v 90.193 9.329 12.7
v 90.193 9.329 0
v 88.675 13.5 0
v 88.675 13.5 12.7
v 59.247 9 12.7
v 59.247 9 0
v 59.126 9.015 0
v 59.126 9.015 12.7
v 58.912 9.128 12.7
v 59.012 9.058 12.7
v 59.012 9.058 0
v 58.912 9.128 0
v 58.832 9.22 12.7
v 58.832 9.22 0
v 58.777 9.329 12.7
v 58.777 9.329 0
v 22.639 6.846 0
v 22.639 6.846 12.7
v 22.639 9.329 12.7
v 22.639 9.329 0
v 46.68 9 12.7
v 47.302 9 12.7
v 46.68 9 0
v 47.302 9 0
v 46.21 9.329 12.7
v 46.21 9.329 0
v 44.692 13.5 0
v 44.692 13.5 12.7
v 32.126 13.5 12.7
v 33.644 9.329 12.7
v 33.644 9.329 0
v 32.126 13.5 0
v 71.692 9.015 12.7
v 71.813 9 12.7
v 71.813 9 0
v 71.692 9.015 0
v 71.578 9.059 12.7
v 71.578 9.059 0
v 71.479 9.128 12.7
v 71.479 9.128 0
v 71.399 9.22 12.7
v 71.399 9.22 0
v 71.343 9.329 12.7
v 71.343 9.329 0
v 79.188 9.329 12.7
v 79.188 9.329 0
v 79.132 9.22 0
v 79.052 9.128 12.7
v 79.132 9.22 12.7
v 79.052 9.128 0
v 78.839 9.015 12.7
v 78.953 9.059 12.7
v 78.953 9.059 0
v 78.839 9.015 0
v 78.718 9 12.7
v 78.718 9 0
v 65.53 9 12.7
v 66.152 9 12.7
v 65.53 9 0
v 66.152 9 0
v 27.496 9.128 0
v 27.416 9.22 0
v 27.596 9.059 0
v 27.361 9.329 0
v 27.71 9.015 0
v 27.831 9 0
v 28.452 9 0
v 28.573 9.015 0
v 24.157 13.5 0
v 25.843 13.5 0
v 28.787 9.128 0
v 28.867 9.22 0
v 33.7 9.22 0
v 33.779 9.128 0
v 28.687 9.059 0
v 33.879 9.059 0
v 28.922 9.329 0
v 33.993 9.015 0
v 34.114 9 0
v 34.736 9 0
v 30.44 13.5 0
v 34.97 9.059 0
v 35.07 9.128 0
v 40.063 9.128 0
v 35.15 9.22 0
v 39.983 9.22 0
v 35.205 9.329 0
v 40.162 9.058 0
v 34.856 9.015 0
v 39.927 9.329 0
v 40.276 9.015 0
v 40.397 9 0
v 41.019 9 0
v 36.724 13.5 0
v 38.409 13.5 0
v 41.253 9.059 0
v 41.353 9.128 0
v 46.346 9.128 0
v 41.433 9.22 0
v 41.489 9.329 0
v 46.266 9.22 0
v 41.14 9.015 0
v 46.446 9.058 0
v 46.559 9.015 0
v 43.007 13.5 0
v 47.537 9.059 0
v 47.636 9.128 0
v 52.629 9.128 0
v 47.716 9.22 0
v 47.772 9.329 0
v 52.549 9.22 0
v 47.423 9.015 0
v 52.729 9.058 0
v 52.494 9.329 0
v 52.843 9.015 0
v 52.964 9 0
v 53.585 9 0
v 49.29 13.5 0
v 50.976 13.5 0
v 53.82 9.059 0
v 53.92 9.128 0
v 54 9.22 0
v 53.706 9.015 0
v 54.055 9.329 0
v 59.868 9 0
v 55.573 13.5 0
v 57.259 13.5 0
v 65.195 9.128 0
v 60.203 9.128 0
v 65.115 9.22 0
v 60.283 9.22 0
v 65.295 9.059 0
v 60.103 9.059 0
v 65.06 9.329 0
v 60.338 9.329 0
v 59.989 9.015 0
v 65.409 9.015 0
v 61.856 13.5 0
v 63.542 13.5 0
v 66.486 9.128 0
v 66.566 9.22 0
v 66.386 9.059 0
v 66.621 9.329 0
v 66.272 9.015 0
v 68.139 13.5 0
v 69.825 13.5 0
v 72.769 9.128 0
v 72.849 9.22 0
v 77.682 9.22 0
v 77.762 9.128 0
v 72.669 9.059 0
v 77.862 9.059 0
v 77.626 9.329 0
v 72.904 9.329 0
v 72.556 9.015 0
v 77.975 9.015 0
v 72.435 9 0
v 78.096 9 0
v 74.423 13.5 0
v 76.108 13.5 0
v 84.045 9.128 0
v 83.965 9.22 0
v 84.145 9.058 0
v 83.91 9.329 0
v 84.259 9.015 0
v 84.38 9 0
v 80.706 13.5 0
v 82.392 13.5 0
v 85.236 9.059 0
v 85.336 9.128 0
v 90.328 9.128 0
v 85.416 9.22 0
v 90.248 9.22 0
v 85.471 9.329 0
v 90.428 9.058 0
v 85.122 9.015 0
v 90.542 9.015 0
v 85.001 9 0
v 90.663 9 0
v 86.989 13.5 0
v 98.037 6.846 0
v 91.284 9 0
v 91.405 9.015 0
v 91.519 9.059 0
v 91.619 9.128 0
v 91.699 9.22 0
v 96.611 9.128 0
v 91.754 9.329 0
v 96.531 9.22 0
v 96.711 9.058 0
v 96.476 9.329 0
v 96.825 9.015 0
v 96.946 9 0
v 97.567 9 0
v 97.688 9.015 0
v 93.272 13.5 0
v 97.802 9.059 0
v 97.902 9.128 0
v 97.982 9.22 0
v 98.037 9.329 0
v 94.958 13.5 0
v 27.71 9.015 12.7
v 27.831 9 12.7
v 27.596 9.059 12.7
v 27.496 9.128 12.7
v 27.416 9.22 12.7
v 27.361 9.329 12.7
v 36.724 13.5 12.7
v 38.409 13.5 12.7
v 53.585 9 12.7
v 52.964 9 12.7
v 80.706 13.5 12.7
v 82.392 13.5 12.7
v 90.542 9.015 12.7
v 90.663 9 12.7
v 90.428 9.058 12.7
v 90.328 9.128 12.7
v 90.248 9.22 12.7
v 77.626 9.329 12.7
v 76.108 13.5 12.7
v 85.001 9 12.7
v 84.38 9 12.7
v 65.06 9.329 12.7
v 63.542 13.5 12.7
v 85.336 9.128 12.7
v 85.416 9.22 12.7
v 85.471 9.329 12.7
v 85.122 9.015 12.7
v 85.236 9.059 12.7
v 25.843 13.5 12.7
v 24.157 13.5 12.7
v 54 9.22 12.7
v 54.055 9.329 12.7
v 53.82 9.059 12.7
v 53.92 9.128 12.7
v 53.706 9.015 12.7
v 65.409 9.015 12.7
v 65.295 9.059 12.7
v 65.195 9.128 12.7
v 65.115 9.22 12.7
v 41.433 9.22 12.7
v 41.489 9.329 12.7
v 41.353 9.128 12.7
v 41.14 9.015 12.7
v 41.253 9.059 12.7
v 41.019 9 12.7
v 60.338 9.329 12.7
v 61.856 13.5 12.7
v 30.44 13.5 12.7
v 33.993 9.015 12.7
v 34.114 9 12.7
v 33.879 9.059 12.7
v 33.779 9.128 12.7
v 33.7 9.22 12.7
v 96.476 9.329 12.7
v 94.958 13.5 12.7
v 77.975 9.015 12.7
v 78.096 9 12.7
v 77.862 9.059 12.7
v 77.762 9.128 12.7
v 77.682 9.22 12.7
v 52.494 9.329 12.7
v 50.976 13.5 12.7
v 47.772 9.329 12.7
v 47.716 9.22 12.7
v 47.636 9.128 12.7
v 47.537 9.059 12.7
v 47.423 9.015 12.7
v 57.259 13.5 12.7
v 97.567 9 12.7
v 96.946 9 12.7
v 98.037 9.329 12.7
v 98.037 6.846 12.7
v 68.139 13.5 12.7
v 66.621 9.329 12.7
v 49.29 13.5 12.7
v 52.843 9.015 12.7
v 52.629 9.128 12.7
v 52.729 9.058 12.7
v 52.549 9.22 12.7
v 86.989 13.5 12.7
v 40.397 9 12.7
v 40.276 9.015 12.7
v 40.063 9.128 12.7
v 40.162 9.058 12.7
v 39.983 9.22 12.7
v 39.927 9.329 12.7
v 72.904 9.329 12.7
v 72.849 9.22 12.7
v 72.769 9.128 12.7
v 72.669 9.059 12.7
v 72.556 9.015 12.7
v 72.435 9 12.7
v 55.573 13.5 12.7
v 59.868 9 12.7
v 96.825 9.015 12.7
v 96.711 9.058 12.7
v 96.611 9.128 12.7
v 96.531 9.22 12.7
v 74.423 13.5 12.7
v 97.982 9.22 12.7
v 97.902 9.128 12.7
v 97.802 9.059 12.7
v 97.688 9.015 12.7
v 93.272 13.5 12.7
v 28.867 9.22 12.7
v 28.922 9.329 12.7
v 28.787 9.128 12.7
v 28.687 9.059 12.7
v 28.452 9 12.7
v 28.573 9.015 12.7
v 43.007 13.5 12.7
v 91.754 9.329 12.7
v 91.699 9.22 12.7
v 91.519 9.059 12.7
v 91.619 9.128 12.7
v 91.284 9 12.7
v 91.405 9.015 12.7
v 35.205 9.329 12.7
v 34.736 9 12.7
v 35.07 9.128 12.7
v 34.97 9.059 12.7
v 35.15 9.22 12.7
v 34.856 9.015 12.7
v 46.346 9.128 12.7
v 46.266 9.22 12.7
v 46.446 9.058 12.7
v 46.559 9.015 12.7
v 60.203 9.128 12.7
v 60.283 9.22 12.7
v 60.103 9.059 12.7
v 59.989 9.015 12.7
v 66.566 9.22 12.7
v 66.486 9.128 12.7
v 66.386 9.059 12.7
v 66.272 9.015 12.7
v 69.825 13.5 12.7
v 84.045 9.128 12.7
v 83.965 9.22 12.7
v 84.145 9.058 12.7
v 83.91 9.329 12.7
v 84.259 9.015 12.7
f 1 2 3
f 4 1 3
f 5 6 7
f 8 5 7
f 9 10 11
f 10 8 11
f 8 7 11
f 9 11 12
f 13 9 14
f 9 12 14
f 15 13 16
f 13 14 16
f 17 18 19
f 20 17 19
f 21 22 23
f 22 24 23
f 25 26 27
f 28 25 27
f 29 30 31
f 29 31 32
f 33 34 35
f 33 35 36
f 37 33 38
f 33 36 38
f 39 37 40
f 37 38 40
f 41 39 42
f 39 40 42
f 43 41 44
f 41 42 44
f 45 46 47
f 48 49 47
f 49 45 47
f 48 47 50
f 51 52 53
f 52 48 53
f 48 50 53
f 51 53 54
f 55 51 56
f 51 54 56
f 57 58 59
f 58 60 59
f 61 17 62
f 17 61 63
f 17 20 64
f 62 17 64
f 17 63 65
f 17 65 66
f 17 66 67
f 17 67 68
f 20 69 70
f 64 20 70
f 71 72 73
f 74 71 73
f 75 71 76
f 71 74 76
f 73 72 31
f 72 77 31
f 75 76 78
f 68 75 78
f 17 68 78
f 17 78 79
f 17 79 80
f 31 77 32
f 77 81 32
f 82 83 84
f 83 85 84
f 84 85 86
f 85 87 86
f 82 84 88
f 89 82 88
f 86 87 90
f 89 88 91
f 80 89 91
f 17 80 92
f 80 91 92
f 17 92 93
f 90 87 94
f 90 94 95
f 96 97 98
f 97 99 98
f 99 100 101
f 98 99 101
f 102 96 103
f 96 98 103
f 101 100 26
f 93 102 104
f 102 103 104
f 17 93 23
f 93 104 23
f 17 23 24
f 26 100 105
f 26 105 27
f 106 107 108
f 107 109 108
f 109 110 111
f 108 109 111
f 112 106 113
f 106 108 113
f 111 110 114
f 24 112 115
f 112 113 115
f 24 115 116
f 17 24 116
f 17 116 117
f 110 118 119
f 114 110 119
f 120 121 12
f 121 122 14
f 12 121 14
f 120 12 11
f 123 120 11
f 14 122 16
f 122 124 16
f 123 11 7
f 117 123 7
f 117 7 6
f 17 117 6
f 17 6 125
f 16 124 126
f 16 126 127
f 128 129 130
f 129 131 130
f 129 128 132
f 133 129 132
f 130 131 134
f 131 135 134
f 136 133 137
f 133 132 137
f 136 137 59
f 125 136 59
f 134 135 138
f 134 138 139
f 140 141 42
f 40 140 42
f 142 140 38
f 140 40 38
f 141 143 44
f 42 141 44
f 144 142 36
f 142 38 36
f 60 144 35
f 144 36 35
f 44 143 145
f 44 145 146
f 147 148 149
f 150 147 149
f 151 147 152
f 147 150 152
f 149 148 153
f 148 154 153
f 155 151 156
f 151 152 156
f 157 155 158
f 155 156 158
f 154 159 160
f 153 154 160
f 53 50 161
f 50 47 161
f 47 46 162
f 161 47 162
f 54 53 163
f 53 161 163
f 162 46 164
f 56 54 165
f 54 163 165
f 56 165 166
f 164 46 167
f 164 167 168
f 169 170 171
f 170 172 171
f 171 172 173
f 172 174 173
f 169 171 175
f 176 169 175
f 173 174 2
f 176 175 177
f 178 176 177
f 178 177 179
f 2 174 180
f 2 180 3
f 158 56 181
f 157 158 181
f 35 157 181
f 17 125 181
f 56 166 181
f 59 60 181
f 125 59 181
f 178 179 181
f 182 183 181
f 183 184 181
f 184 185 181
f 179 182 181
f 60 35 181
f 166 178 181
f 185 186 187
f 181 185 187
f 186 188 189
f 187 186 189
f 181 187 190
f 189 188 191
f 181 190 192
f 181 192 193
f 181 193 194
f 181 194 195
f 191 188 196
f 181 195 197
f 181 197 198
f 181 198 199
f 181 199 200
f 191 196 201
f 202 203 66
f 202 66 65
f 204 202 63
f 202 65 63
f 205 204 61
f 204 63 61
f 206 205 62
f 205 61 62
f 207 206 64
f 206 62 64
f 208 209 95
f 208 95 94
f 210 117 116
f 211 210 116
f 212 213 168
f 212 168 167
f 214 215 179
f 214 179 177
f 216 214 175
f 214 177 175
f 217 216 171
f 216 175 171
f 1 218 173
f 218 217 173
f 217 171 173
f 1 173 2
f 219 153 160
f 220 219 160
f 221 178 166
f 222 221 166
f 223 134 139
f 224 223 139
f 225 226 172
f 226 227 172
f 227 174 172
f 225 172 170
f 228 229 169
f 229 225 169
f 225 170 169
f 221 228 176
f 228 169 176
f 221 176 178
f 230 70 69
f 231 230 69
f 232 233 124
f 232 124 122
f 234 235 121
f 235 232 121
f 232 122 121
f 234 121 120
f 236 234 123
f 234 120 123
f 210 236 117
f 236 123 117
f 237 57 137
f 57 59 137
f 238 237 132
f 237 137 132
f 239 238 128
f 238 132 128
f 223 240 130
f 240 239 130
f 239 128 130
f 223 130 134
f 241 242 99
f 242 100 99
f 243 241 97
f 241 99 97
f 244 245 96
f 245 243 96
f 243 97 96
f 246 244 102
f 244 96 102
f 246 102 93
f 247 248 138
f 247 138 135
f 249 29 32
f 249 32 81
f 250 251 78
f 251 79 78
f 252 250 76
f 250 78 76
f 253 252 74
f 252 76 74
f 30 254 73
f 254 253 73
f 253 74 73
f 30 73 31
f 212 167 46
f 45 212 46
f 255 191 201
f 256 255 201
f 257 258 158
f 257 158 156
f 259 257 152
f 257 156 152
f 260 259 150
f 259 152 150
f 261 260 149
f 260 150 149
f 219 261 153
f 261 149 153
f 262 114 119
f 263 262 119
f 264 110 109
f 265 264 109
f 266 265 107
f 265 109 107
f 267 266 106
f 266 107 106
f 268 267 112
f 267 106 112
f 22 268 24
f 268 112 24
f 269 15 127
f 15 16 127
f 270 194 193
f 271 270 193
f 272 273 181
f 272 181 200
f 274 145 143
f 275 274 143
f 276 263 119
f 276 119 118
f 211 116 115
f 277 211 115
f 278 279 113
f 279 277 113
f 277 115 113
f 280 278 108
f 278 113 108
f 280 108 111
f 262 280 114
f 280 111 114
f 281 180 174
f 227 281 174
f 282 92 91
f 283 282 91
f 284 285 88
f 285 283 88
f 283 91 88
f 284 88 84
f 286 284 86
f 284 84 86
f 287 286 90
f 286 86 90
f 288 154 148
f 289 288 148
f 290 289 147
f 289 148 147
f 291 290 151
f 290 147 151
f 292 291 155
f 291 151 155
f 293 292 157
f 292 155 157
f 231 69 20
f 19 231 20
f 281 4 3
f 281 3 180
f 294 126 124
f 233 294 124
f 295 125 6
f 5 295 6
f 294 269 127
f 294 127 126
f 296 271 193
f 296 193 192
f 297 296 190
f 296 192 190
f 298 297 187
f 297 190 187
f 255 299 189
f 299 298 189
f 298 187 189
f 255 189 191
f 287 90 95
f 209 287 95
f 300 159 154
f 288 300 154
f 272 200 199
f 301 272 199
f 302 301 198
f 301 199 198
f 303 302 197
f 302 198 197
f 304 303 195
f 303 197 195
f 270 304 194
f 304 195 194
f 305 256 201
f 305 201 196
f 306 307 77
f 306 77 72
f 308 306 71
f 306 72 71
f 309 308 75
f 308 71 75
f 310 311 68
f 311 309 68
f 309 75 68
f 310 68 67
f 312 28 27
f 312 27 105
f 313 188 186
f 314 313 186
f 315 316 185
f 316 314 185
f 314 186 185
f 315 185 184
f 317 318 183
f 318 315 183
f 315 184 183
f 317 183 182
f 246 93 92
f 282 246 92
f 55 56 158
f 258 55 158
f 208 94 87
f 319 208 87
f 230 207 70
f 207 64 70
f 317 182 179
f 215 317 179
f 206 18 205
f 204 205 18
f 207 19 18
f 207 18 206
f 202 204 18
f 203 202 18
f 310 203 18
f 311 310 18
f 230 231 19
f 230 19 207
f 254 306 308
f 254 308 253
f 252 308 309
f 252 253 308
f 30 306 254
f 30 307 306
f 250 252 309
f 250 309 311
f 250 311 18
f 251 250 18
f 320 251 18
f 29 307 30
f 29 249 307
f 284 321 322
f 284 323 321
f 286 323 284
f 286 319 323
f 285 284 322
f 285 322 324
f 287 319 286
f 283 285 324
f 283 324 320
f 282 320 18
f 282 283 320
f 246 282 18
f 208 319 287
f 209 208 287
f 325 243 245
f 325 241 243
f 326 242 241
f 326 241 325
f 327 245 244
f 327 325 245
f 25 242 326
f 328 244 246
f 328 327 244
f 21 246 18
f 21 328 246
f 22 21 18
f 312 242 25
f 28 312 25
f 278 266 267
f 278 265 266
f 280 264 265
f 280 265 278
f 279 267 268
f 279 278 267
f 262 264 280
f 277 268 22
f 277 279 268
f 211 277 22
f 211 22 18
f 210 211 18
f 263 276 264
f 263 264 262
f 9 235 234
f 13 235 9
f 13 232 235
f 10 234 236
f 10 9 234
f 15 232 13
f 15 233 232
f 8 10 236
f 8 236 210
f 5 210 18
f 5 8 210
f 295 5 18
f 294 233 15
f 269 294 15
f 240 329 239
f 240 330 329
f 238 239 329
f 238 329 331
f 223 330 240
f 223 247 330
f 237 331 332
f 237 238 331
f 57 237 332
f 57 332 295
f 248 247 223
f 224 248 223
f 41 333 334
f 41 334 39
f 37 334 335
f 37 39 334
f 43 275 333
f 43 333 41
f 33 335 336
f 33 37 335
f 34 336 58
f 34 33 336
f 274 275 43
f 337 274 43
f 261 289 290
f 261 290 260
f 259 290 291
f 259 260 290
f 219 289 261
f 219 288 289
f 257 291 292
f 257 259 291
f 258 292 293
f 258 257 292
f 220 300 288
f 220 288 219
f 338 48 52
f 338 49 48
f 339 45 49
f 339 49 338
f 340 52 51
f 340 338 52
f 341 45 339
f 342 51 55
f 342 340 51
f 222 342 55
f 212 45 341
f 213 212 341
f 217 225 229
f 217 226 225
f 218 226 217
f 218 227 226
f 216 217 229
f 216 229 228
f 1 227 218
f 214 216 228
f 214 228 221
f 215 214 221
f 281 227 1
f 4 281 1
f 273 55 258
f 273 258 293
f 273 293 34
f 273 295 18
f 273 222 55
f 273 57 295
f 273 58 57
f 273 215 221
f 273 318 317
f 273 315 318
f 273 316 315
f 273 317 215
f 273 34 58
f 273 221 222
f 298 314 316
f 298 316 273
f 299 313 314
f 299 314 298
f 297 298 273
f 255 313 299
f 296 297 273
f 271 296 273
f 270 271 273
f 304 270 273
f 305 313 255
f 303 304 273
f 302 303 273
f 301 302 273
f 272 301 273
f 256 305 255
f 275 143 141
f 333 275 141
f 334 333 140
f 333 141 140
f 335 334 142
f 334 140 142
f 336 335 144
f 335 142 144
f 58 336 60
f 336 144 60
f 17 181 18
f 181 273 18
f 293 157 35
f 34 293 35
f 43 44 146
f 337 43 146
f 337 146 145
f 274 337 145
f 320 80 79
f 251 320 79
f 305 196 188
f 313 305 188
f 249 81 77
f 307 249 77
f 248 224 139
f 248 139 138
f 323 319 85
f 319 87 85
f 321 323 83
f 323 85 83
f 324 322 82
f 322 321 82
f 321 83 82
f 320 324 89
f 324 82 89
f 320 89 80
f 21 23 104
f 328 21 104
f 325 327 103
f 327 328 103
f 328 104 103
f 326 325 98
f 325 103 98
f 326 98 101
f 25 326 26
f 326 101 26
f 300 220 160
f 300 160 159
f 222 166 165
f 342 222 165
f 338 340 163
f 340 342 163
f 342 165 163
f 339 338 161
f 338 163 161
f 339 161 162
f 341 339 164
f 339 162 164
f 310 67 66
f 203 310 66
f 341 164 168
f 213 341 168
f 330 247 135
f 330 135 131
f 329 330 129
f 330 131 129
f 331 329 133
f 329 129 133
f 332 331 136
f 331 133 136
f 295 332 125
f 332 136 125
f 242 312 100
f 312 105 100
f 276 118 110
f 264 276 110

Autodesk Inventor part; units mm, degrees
ref_plane "YZ Plane" through (0, 0, 0) normal (1, 0, 0) x (0, 1, 0)
ref_plane "XZ Plane" through (0, 0, 0) normal (0, 1, 0) x (-1, 0, 0)
ref_plane "XY Plane" through (0, 0, 0) normal (0, 0, 1) x (1, 0, 0)
sketch "Sketch1" plane through (0, 0, 0) normal (0, 0, 1) x (1, 0, 0)
  line L0 (27.361, 9.329) -> (25.8429, 13.5)
  line L1 (25.8429, 13.5) -> (24.1571, 13.5)
  line L2 (24.1571, 13.5) -> (22.639, 9.329)
  arc A0 (22.1692, 9) -> (22.639, 9.329) centre (22.1692, 9.5) ccw
  line L3 (22.1692, 9) -> (0, 9)
  line L4 (0, 9) -> (0, 0)
  line L5 (0, 0) -> (175.6637, 0)
  line L6 (175.6637, 0) -> (175.6637, 9)
  line L7 (175.6637, 9) -> (153.4945, 9)
  arc A1 (153.0247, 9.329) -> (153.4945, 9) centre (153.4945, 9.5) ccw
  line L8 (153.0247, 9.329) -> (151.5066, 13.5)
  line L9 (151.5066, 13.5) -> (149.8209, 13.5)
  line L10 (149.8209, 13.5) -> (148.3027, 9.329)
  arc A2 (147.8329, 9) -> (148.3027, 9.329) centre (147.8329, 9.5) ccw
  line L11 (147.8329, 9) -> (147.2113, 9)
  arc A3 (146.7415, 9.329) -> (147.2113, 9) centre (147.2113, 9.5) ccw
  line L12 (146.7415, 9.329) -> (145.2234, 13.5)
  line L13 (145.2234, 13.5) -> (143.5377, 13.5)
  line L14 (143.5377, 13.5) -> (142.0195, 9.329)
  arc A4 (141.5497, 9) -> (142.0195, 9.329) centre (141.5497, 9.5) ccw
  line L15 (141.5497, 9) -> (140.9282, 9)
  arc A5 (140.4583, 9.329) -> (140.9282, 9) centre (140.9282, 9.5) ccw
  line L16 (140.4583, 9.329) -> (138.9402, 13.5)
  line L17 (138.9402, 13.5) -> (137.2545, 13.5)
  line L18 (137.2545, 13.5) -> (135.7364, 9.329)
  arc A6 (135.2665, 9) -> (135.7364, 9.329) centre (135.2665, 9.5) ccw
  line L19 (135.2665, 9) -> (134.645, 9)
  arc A7 (134.1751, 9.329) -> (134.645, 9) centre (134.645, 9.5) ccw
  line L20 (134.1751, 9.329) -> (132.657, 13.5)
  line L21 (132.657, 13.5) -> (130.9713, 13.5)
  line L22 (130.9713, 13.5) -> (129.4532, 9.329)
  arc A8 (128.9833, 9) -> (129.4532, 9.329) centre (128.9833, 9.5) ccw
  line L23 (128.9833, 9) -> (128.3618, 9)
  arc A9 (127.8919, 9.329) -> (128.3618, 9) centre (128.3618, 9.5) ccw
  line L24 (127.8919, 9.329) -> (126.3738, 13.5)
  line L25 (126.3738, 13.5) -> (124.6881, 13.5)
  line L26 (124.6881, 13.5) -> (123.17, 9.329)
  arc A10 (122.7001, 9) -> (123.17, 9.329) centre (122.7001, 9.5) ccw
  line L27 (122.7001, 9) -> (122.0786, 9)
  arc A11 (121.6088, 9.329) -> (122.0786, 9) centre (122.0786, 9.5) ccw
  line L28 (121.6088, 9.329) -> (120.0906, 13.5)
  line L29 (120.0906, 13.5) -> (118.4049, 13.5)
  line L30 (118.4049, 13.5) -> (116.8868, 9.329)
  arc A12 (116.417, 9) -> (116.8868, 9.329) centre (116.417, 9.5) ccw
  line L31 (116.417, 9) -> (115.7954, 9)
  arc A13 (115.3256, 9.329) -> (115.7954, 9) centre (115.7954, 9.5) ccw
  line L32 (115.3256, 9.329) -> (113.8075, 13.5)
  line L33 (113.8075, 13.5) -> (112.1217, 13.5)
  line L34 (112.1217, 13.5) -> (110.6036, 9.329)
  arc A14 (110.1338, 9) -> (110.6036, 9.329) centre (110.1338, 9.5) ccw
  line L35 (110.1338, 9) -> (109.5122, 9)
  arc A15 (109.0424, 9.329) -> (109.5122, 9) centre (109.5122, 9.5) ccw
  line L36 (109.0424, 9.329) -> (107.5243, 13.5)
  line L37 (107.5243, 13.5) -> (105.8386, 13.5)
  line L38 (105.8386, 13.5) -> (104.3204, 9.329)
  arc A16 (103.8506, 9) -> (104.3204, 9.329) centre (103.8506, 9.5) ccw
  line L39 (103.8506, 9) -> (103.229, 9)
  arc A17 (102.7592, 9.329) -> (103.229, 9) centre (103.229, 9.5) ccw
  line L40 (102.7592, 9.329) -> (101.2411, 13.5)
  line L41 (101.2411, 13.5) -> (99.5554, 13.5)
  line L42 (99.5554, 13.5) -> (98.0372, 9.329)
  arc A18 (97.5674, 9) -> (98.0372, 9.329) centre (97.5674, 9.5) ccw
  line L43 (97.5674, 9) -> (96.9459, 9)
  arc A19 (96.476, 9.329) -> (96.9459, 9) centre (96.9459, 9.5) ccw
  line L44 (96.476, 9.329) -> (94.9579, 13.5)
  line L45 (94.9579, 13.5) -> (93.2722, 13.5)
  line L46 (93.2722, 13.5) -> (91.7541, 9.329)
  arc A20 (91.2842, 9) -> (91.7541, 9.329) centre (91.2842, 9.5) ccw
  line L47 (91.2842, 9) -> (90.6627, 9)
  arc A21 (90.1928, 9.329) -> (90.6627, 9) centre (90.6627, 9.5) ccw
  line L48 (90.1928, 9.329) -> (88.6747, 13.5)
  line L49 (88.6747, 13.5) -> (86.989, 13.5)
  line L50 (86.989, 13.5) -> (85.4709, 9.329)
  arc A22 (85.001, 9) -> (85.4709, 9.329) centre (85.001, 9.5) ccw
  line L51 (85.001, 9) -> (84.3795, 9)
  arc A23 (83.9096, 9.329) -> (84.3795, 9) centre (84.3795, 9.5) ccw
  line L52 (83.9096, 9.329) -> (82.3915, 13.5)
  line L53 (82.3915, 13.5) -> (80.7058, 13.5)
  line L54 (80.7058, 13.5) -> (79.1877, 9.329)
  arc A24 (78.7178, 9) -> (79.1877, 9.329) centre (78.7178, 9.5) ccw
  line L55 (78.7178, 9) -> (78.0963, 9)
  arc A25 (77.6265, 9.329) -> (78.0963, 9) centre (78.0963, 9.5) ccw
  line L56 (77.6265, 9.329) -> (76.1083, 13.5)
  line L57 (76.1083, 13.5) -> (74.4226, 13.5)
  line L58 (74.4226, 13.5) -> (72.9045, 9.329)
  arc A26 (72.4347, 9) -> (72.9045, 9.329) centre (72.4347, 9.5) ccw
  line L59 (72.4347, 9) -> (71.8131, 9)
  arc A27 (71.3433, 9.329) -> (71.8131, 9) centre (71.8131, 9.5) ccw
  line L60 (71.3433, 9.329) -> (69.8252, 13.5)
  line L61 (69.8252, 13.5) -> (68.1394, 13.5)
  line L62 (68.1394, 13.5) -> (66.6213, 9.329)
  arc A28 (66.1515, 9) -> (66.6213, 9.329) centre (66.1515, 9.5) ccw
  line L63 (66.1515, 9) -> (65.5299, 9)
  arc A29 (65.0601, 9.329) -> (65.5299, 9) centre (65.5299, 9.5) ccw
  line L64 (65.0601, 9.329) -> (63.542, 13.5)
  line L65 (63.542, 13.5) -> (61.8563, 13.5)
  line L66 (61.8563, 13.5) -> (60.3381, 9.329)
  arc A30 (59.8683, 9) -> (60.3381, 9.329) centre (59.8683, 9.5) ccw
  line L67 (59.8683, 9) -> (59.2468, 9)
  arc A31 (58.7769, 9.329) -> (59.2468, 9) centre (59.2468, 9.5) ccw
  line L68 (58.7769, 9.329) -> (57.2588, 13.5)
  line L69 (57.2588, 13.5) -> (55.5731, 13.5)
  line L70 (55.5731, 13.5) -> (54.0549, 9.329)
  arc A32 (53.5851, 9) -> (54.0549, 9.329) centre (53.5851, 9.5) ccw
  line L71 (53.5851, 9) -> (52.9636, 9)
  arc A33 (52.4937, 9.329) -> (52.9636, 9) centre (52.9636, 9.5) ccw
  line L72 (52.4937, 9.329) -> (50.9756, 13.5)
  line L73 (50.9756, 13.5) -> (49.2899, 13.5)
  line L74 (49.2899, 13.5) -> (47.7718, 9.329)
  arc A34 (47.3019, 9) -> (47.7718, 9.329) centre (47.3019, 9.5) ccw
  line L75 (47.3019, 9) -> (46.6804, 9)
  arc A35 (46.2105, 9.329) -> (46.6804, 9) centre (46.6804, 9.5) ccw
  line L76 (46.2105, 9.329) -> (44.6924, 13.5)
  line L77 (44.6924, 13.5) -> (43.0067, 13.5)
  line L78 (43.0067, 13.5) -> (41.4886, 9.329)
  arc A36 (41.0187, 9) -> (41.4886, 9.329) centre (41.0187, 9.5) ccw
  line L79 (41.0187, 9) -> (40.3972, 9)
  arc A37 (39.9273, 9.329) -> (40.3972, 9) centre (40.3972, 9.5) ccw
  line L80 (39.9273, 9.329) -> (38.4092, 13.5)
  line L81 (38.4092, 13.5) -> (36.7235, 13.5)
  line L82 (36.7235, 13.5) -> (35.2054, 9.329)
  arc A38 (34.7355, 9) -> (35.2054, 9.329) centre (34.7355, 9.5) ccw
  line L83 (34.7355, 9) -> (34.114, 9)
  arc A39 (33.6442, 9.329) -> (34.114, 9) centre (34.114, 9.5) ccw
  line L84 (33.6442, 9.329) -> (32.126, 13.5)
  line L85 (32.126, 13.5) -> (30.4403, 13.5)
  line L86 (30.4403, 13.5) -> (28.9222, 9.329)
  arc A40 (28.4524, 9) -> (28.9222, 9.329) centre (28.4524, 9.5) ccw
  line L87 (28.4524, 9) -> (27.8308, 9)
  arc A41 (27.361, 9.329) -> (27.8308, 9) centre (27.8308, 9.5) ccw
  point P0 (87.8319, 5)
extrude "Extrusion1" add sketch "Sketch1" along normal blind 12.7
sketch "Sketch2" plane through (0, 0, 12.7) normal (0, 0, 1) x (1, 0, 0)
  line L0 (0, 9) -> (22.1692, 9) projected
  line L1 (175.6637, 9) -> (153.4945, 9) projected
  line L2 (0, 9) -> (175.6637, 9)
  point P0 (0, 0)
sketch "Sketch3" plane through (0, 0, 12.7) normal (0, 0, 1) x (1, 0, 0)
  line L0 (22.639, 9.329) -> (24.1571, 13.5) projected
  line L1 (175.6637, 0) -> (0, 0) projected
  line L2 (22.639, 9.329) -> (0, 9.329)
  line L3 (0, 9.329) -> (0, 0)
  line L4 (0, 0) -> (22.639, 0)
  line L5 (22.639, 0) -> (22.639, 9.329)
  line L6 (22.639, 0) -> (98.839, 0)
  line L7 (98.0372, 13.6919) -> (175.6637, 13.6919)
  line L8 (175.6637, 13.6919) -> (175.6637, 0)
  line L9 (175.6637, 0) -> (98.0372, 0)
  line L10 (98.0372, 0) -> (98.0372, 13.6919)
  line L11 (22.639, 0) -> (98.0372, 0)
  line L12 (98.0372, 0) -> (98.0372, 6.846)
  line L13 (98.0372, 6.846) -> (22.639, 6.846)
  line L14 (22.639, 6.846) -> (22.639, 0)
  dimension "d3" = 13.6919
  dimension "d4" = 77.6265
  dimension "d5" = 74.7953
extrude "Extrusion2" cut sketch "Sketch3" against normal blind 25.4
properties part number "Rack"
